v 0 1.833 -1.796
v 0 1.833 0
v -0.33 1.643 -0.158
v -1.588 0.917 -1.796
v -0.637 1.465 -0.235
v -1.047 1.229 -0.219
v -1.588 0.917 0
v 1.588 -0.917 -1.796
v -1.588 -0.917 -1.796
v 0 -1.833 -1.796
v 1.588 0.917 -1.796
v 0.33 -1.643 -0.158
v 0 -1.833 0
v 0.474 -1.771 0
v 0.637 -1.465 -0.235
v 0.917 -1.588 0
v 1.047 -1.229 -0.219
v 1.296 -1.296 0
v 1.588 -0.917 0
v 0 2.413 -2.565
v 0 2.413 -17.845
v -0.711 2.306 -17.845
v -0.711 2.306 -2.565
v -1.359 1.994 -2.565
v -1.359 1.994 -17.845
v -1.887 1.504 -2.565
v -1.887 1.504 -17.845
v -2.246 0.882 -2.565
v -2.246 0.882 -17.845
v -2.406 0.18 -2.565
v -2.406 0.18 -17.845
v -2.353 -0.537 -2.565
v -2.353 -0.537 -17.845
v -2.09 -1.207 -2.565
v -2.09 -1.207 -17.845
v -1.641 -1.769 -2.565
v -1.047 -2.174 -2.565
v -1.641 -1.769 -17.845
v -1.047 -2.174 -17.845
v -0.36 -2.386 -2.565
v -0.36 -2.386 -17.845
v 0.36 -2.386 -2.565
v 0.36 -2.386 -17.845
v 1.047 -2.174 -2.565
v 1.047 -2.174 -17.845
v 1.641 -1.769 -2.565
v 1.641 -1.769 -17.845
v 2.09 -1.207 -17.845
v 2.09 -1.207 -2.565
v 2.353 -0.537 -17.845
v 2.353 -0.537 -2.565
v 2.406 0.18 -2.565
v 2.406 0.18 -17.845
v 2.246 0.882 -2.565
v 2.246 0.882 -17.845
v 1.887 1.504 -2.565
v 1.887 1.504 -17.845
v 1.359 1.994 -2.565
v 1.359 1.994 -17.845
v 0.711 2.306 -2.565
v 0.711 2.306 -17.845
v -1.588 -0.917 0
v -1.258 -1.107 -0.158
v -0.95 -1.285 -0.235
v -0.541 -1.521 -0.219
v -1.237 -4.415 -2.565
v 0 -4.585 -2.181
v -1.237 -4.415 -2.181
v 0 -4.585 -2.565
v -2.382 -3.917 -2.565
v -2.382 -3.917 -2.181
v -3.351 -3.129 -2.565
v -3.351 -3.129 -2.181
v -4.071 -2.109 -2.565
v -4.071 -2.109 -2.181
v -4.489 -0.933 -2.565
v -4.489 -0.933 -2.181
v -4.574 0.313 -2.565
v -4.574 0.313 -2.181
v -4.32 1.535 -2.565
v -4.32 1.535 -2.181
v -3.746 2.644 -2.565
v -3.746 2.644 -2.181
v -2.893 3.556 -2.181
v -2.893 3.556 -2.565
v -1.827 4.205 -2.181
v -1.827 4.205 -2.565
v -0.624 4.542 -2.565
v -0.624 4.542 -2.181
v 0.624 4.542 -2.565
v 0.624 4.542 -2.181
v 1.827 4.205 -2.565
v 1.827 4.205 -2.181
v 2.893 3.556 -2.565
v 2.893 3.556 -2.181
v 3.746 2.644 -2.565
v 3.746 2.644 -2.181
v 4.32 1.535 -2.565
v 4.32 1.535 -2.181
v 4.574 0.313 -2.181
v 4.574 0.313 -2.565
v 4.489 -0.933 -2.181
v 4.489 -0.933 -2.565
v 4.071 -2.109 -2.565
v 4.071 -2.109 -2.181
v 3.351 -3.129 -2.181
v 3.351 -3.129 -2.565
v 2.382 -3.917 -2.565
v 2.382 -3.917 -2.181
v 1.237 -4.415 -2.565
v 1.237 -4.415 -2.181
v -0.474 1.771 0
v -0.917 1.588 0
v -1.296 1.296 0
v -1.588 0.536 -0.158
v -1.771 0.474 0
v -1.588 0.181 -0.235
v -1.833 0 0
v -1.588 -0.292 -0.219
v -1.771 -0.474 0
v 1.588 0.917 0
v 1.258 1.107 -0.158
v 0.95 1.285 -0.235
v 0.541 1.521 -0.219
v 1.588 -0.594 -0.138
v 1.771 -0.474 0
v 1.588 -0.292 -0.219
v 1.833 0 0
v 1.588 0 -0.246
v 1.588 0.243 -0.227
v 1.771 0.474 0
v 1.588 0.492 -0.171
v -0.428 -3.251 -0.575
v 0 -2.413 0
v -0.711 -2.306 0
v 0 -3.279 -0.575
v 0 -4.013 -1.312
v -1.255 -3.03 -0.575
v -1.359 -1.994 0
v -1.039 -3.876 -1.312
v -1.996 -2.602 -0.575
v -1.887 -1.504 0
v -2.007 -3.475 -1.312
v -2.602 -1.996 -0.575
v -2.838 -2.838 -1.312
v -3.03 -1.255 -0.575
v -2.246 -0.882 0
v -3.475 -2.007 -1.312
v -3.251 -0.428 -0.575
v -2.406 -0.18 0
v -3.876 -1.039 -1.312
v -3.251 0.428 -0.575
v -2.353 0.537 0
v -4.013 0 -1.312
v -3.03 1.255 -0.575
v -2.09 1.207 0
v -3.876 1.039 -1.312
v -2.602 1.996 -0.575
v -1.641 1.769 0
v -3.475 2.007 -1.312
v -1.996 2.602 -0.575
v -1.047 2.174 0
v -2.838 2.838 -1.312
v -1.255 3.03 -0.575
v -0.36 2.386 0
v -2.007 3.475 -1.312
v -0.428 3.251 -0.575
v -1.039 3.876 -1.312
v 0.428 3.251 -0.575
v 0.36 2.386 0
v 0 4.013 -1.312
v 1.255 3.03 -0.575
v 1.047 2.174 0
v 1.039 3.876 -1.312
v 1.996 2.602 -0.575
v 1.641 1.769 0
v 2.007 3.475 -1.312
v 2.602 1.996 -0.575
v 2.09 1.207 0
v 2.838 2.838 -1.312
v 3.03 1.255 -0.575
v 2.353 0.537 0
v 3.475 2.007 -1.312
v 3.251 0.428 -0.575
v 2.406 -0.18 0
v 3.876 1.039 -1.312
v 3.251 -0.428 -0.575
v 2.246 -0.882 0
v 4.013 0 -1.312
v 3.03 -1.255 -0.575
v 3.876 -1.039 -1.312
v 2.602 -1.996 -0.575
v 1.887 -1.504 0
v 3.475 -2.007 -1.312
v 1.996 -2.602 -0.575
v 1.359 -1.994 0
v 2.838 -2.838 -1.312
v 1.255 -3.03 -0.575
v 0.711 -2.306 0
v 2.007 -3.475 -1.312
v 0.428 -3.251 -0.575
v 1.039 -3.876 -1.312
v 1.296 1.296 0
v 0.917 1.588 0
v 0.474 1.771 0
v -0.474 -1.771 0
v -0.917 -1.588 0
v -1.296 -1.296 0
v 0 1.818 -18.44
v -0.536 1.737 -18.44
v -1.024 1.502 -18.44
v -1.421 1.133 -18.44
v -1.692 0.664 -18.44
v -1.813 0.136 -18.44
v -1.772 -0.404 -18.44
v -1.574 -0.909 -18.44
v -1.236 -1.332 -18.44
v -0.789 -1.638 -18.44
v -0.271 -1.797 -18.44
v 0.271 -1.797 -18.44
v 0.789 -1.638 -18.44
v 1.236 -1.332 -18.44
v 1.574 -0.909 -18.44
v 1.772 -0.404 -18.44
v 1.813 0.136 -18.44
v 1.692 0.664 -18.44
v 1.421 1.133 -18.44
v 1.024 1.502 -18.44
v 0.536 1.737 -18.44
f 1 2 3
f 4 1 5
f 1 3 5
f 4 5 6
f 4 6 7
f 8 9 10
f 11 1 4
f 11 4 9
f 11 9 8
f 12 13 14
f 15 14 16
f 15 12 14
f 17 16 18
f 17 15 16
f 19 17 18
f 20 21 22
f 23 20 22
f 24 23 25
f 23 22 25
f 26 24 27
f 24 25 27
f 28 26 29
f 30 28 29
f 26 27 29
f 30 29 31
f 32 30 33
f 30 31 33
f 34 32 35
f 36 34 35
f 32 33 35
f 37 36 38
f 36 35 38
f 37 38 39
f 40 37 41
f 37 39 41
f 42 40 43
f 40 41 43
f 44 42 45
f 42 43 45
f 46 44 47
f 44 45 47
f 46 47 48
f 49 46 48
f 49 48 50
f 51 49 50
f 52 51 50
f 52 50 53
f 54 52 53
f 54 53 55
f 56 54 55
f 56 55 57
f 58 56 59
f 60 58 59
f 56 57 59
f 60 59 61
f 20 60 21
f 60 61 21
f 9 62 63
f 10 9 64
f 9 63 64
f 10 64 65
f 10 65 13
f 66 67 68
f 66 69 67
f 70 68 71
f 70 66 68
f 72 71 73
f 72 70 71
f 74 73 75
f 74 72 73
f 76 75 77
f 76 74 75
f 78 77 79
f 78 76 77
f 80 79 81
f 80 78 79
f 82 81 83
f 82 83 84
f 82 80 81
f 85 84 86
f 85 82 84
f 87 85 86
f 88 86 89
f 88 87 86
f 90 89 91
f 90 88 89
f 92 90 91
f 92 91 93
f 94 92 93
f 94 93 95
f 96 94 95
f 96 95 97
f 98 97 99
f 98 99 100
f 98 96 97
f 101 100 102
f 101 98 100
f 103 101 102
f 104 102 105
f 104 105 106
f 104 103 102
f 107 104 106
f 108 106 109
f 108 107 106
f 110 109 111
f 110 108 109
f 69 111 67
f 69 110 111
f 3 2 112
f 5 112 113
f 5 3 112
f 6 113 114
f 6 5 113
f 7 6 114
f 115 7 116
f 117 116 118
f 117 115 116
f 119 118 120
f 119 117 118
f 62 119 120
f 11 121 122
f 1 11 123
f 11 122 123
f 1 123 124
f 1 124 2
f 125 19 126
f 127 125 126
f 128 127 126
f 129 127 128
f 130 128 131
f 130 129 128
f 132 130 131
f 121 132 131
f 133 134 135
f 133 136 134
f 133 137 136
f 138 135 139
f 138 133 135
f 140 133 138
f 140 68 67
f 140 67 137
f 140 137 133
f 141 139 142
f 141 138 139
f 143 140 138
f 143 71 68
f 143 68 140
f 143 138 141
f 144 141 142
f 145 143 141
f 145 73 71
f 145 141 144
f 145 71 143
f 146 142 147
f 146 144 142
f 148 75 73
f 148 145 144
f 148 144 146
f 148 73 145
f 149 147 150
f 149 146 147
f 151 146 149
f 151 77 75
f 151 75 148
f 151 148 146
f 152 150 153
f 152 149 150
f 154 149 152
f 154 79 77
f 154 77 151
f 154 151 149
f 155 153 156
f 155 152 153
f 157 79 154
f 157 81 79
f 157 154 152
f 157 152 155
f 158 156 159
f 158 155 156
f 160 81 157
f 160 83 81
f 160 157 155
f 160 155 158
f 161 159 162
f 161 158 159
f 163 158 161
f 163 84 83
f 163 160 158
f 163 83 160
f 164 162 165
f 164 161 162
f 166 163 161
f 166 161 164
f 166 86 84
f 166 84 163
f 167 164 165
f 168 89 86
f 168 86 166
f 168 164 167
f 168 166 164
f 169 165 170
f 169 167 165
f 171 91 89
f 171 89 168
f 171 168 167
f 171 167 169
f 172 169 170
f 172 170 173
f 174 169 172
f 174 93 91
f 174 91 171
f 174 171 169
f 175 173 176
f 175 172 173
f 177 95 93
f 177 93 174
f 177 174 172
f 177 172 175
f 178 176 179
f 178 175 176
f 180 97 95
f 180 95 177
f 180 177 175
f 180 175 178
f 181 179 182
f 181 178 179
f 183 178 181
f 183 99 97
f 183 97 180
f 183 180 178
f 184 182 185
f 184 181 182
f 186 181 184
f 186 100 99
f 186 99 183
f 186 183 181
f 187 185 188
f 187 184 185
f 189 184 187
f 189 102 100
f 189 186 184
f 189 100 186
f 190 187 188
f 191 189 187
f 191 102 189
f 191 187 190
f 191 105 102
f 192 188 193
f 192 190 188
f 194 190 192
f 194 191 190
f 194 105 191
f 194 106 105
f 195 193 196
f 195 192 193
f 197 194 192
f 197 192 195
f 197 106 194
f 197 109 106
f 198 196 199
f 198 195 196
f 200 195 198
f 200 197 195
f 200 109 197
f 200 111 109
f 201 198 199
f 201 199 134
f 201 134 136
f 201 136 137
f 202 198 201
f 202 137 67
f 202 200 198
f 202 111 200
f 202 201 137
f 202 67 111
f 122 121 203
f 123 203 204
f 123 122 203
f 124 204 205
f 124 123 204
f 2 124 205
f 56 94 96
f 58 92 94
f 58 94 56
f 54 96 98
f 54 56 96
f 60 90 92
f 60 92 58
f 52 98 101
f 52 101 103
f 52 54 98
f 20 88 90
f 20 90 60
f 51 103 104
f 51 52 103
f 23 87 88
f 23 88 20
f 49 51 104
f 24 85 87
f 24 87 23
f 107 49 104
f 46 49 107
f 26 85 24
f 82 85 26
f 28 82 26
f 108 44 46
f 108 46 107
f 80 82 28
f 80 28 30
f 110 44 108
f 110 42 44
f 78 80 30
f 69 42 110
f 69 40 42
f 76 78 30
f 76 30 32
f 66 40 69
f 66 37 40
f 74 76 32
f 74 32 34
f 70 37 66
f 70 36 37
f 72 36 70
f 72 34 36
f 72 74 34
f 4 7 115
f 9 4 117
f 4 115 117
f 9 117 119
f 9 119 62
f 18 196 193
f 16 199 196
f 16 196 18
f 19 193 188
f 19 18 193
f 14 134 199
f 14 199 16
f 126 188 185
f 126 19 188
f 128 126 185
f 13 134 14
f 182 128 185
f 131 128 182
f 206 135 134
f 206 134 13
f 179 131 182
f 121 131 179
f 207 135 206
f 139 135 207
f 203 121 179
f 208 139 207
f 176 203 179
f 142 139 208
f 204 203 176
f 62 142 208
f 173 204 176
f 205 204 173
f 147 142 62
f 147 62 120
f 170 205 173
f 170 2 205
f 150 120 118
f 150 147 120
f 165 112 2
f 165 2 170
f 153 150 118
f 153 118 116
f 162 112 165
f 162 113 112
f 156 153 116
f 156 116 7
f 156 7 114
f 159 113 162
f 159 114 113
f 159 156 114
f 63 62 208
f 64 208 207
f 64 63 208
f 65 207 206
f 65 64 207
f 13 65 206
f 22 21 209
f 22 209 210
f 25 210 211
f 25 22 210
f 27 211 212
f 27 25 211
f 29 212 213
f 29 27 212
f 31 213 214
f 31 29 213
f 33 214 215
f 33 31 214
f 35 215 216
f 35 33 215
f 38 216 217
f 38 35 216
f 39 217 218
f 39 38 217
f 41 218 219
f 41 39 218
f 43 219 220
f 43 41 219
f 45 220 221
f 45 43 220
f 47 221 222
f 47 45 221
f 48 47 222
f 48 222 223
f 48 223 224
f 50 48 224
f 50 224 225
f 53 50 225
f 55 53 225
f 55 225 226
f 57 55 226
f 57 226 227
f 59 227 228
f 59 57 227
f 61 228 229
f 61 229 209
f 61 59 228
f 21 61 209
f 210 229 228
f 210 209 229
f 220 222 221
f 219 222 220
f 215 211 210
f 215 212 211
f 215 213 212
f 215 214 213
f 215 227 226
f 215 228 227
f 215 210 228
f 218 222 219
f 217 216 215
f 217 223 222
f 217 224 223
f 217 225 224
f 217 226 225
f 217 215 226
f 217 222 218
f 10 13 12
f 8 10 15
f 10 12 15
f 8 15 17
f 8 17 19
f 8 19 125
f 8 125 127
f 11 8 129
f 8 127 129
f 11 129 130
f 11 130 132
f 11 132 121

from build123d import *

# Parameters (mm, degrees)
SKETCH1_W          = 15.875
SKETCH1_H          = 2.413
CHAMFER1_SIZE      = 0.5953125
CUT_EXTRUDE2_DEPTH = 1.79578
SKETCH6_R          = 1.833087105
CUT_EXTRUDE3_DEPTH = 1.79578
CUT_EXTRUDE3_TAPER = 45


with BuildPart() as part:
    # Sketch1 → Revolve1 (revolve)
    with BuildSketch(Plane(origin=(0, 0, 0), x_dir=(0, 0, -1), z_dir=(1, 0, 0))):
        with Locations((10.5029, 1.2065)):
            Rectangle(SKETCH1_W, SKETCH1_H)
    revolve(axis=Axis((0, 0, -18.4404), (0, 0, 1)))

    # Chamfer1
    chamfer1_edges = [part.edges().sort_by_distance(p)[0] for p in [
        (0, -2.413, -18.4404),
    ]]
    chamfer(chamfer1_edges, length=CHAMFER1_SIZE)

    # Sketch7 → Revolve2 (revolve)
    with BuildSketch(Plane(origin=(0, 0, 0), x_dir=(0, 0, -1), z_dir=(1, 0, 0))):
        with BuildLine():
            Line((2.18059, 4.5847), (2.5654, 4.5847))
            Line((2.5654, 4.5847), (2.5654, 0))
            Line((2.5654, 0), (0, 0))
            Line((0, 0), (0, 2.413))
            ThreePointArc((0, 2.413), (0.925030326, 3.664791196), (2.18059, 4.5847))
        make_face()
    revolve(axis=Axis((0, 0, 0), (0, 0, -1)))

    # Sketch5 → Cut-Extrude2 (cut)
    with BuildSketch(Plane.XY):
        Polygon((1.5875, -0.916543552), (1.5875, 0.916543552), (0, 1.833087105), (-1.5875, 0.916543552), (-1.5875, -0.916543552), (0, -1.833087105), align=None)
    extrude(amount=-CUT_EXTRUDE2_DEPTH, mode=Mode.SUBTRACT)

    # Sketch6 → Cut-Extrude3 (cut)
    with BuildSketch(Plane.XY):
        Circle(SKETCH6_R)
    extrude(amount=-CUT_EXTRUDE3_DEPTH, taper=CUT_EXTRUDE3_TAPER, mode=Mode.SUBTRACT)


solid = part.part
